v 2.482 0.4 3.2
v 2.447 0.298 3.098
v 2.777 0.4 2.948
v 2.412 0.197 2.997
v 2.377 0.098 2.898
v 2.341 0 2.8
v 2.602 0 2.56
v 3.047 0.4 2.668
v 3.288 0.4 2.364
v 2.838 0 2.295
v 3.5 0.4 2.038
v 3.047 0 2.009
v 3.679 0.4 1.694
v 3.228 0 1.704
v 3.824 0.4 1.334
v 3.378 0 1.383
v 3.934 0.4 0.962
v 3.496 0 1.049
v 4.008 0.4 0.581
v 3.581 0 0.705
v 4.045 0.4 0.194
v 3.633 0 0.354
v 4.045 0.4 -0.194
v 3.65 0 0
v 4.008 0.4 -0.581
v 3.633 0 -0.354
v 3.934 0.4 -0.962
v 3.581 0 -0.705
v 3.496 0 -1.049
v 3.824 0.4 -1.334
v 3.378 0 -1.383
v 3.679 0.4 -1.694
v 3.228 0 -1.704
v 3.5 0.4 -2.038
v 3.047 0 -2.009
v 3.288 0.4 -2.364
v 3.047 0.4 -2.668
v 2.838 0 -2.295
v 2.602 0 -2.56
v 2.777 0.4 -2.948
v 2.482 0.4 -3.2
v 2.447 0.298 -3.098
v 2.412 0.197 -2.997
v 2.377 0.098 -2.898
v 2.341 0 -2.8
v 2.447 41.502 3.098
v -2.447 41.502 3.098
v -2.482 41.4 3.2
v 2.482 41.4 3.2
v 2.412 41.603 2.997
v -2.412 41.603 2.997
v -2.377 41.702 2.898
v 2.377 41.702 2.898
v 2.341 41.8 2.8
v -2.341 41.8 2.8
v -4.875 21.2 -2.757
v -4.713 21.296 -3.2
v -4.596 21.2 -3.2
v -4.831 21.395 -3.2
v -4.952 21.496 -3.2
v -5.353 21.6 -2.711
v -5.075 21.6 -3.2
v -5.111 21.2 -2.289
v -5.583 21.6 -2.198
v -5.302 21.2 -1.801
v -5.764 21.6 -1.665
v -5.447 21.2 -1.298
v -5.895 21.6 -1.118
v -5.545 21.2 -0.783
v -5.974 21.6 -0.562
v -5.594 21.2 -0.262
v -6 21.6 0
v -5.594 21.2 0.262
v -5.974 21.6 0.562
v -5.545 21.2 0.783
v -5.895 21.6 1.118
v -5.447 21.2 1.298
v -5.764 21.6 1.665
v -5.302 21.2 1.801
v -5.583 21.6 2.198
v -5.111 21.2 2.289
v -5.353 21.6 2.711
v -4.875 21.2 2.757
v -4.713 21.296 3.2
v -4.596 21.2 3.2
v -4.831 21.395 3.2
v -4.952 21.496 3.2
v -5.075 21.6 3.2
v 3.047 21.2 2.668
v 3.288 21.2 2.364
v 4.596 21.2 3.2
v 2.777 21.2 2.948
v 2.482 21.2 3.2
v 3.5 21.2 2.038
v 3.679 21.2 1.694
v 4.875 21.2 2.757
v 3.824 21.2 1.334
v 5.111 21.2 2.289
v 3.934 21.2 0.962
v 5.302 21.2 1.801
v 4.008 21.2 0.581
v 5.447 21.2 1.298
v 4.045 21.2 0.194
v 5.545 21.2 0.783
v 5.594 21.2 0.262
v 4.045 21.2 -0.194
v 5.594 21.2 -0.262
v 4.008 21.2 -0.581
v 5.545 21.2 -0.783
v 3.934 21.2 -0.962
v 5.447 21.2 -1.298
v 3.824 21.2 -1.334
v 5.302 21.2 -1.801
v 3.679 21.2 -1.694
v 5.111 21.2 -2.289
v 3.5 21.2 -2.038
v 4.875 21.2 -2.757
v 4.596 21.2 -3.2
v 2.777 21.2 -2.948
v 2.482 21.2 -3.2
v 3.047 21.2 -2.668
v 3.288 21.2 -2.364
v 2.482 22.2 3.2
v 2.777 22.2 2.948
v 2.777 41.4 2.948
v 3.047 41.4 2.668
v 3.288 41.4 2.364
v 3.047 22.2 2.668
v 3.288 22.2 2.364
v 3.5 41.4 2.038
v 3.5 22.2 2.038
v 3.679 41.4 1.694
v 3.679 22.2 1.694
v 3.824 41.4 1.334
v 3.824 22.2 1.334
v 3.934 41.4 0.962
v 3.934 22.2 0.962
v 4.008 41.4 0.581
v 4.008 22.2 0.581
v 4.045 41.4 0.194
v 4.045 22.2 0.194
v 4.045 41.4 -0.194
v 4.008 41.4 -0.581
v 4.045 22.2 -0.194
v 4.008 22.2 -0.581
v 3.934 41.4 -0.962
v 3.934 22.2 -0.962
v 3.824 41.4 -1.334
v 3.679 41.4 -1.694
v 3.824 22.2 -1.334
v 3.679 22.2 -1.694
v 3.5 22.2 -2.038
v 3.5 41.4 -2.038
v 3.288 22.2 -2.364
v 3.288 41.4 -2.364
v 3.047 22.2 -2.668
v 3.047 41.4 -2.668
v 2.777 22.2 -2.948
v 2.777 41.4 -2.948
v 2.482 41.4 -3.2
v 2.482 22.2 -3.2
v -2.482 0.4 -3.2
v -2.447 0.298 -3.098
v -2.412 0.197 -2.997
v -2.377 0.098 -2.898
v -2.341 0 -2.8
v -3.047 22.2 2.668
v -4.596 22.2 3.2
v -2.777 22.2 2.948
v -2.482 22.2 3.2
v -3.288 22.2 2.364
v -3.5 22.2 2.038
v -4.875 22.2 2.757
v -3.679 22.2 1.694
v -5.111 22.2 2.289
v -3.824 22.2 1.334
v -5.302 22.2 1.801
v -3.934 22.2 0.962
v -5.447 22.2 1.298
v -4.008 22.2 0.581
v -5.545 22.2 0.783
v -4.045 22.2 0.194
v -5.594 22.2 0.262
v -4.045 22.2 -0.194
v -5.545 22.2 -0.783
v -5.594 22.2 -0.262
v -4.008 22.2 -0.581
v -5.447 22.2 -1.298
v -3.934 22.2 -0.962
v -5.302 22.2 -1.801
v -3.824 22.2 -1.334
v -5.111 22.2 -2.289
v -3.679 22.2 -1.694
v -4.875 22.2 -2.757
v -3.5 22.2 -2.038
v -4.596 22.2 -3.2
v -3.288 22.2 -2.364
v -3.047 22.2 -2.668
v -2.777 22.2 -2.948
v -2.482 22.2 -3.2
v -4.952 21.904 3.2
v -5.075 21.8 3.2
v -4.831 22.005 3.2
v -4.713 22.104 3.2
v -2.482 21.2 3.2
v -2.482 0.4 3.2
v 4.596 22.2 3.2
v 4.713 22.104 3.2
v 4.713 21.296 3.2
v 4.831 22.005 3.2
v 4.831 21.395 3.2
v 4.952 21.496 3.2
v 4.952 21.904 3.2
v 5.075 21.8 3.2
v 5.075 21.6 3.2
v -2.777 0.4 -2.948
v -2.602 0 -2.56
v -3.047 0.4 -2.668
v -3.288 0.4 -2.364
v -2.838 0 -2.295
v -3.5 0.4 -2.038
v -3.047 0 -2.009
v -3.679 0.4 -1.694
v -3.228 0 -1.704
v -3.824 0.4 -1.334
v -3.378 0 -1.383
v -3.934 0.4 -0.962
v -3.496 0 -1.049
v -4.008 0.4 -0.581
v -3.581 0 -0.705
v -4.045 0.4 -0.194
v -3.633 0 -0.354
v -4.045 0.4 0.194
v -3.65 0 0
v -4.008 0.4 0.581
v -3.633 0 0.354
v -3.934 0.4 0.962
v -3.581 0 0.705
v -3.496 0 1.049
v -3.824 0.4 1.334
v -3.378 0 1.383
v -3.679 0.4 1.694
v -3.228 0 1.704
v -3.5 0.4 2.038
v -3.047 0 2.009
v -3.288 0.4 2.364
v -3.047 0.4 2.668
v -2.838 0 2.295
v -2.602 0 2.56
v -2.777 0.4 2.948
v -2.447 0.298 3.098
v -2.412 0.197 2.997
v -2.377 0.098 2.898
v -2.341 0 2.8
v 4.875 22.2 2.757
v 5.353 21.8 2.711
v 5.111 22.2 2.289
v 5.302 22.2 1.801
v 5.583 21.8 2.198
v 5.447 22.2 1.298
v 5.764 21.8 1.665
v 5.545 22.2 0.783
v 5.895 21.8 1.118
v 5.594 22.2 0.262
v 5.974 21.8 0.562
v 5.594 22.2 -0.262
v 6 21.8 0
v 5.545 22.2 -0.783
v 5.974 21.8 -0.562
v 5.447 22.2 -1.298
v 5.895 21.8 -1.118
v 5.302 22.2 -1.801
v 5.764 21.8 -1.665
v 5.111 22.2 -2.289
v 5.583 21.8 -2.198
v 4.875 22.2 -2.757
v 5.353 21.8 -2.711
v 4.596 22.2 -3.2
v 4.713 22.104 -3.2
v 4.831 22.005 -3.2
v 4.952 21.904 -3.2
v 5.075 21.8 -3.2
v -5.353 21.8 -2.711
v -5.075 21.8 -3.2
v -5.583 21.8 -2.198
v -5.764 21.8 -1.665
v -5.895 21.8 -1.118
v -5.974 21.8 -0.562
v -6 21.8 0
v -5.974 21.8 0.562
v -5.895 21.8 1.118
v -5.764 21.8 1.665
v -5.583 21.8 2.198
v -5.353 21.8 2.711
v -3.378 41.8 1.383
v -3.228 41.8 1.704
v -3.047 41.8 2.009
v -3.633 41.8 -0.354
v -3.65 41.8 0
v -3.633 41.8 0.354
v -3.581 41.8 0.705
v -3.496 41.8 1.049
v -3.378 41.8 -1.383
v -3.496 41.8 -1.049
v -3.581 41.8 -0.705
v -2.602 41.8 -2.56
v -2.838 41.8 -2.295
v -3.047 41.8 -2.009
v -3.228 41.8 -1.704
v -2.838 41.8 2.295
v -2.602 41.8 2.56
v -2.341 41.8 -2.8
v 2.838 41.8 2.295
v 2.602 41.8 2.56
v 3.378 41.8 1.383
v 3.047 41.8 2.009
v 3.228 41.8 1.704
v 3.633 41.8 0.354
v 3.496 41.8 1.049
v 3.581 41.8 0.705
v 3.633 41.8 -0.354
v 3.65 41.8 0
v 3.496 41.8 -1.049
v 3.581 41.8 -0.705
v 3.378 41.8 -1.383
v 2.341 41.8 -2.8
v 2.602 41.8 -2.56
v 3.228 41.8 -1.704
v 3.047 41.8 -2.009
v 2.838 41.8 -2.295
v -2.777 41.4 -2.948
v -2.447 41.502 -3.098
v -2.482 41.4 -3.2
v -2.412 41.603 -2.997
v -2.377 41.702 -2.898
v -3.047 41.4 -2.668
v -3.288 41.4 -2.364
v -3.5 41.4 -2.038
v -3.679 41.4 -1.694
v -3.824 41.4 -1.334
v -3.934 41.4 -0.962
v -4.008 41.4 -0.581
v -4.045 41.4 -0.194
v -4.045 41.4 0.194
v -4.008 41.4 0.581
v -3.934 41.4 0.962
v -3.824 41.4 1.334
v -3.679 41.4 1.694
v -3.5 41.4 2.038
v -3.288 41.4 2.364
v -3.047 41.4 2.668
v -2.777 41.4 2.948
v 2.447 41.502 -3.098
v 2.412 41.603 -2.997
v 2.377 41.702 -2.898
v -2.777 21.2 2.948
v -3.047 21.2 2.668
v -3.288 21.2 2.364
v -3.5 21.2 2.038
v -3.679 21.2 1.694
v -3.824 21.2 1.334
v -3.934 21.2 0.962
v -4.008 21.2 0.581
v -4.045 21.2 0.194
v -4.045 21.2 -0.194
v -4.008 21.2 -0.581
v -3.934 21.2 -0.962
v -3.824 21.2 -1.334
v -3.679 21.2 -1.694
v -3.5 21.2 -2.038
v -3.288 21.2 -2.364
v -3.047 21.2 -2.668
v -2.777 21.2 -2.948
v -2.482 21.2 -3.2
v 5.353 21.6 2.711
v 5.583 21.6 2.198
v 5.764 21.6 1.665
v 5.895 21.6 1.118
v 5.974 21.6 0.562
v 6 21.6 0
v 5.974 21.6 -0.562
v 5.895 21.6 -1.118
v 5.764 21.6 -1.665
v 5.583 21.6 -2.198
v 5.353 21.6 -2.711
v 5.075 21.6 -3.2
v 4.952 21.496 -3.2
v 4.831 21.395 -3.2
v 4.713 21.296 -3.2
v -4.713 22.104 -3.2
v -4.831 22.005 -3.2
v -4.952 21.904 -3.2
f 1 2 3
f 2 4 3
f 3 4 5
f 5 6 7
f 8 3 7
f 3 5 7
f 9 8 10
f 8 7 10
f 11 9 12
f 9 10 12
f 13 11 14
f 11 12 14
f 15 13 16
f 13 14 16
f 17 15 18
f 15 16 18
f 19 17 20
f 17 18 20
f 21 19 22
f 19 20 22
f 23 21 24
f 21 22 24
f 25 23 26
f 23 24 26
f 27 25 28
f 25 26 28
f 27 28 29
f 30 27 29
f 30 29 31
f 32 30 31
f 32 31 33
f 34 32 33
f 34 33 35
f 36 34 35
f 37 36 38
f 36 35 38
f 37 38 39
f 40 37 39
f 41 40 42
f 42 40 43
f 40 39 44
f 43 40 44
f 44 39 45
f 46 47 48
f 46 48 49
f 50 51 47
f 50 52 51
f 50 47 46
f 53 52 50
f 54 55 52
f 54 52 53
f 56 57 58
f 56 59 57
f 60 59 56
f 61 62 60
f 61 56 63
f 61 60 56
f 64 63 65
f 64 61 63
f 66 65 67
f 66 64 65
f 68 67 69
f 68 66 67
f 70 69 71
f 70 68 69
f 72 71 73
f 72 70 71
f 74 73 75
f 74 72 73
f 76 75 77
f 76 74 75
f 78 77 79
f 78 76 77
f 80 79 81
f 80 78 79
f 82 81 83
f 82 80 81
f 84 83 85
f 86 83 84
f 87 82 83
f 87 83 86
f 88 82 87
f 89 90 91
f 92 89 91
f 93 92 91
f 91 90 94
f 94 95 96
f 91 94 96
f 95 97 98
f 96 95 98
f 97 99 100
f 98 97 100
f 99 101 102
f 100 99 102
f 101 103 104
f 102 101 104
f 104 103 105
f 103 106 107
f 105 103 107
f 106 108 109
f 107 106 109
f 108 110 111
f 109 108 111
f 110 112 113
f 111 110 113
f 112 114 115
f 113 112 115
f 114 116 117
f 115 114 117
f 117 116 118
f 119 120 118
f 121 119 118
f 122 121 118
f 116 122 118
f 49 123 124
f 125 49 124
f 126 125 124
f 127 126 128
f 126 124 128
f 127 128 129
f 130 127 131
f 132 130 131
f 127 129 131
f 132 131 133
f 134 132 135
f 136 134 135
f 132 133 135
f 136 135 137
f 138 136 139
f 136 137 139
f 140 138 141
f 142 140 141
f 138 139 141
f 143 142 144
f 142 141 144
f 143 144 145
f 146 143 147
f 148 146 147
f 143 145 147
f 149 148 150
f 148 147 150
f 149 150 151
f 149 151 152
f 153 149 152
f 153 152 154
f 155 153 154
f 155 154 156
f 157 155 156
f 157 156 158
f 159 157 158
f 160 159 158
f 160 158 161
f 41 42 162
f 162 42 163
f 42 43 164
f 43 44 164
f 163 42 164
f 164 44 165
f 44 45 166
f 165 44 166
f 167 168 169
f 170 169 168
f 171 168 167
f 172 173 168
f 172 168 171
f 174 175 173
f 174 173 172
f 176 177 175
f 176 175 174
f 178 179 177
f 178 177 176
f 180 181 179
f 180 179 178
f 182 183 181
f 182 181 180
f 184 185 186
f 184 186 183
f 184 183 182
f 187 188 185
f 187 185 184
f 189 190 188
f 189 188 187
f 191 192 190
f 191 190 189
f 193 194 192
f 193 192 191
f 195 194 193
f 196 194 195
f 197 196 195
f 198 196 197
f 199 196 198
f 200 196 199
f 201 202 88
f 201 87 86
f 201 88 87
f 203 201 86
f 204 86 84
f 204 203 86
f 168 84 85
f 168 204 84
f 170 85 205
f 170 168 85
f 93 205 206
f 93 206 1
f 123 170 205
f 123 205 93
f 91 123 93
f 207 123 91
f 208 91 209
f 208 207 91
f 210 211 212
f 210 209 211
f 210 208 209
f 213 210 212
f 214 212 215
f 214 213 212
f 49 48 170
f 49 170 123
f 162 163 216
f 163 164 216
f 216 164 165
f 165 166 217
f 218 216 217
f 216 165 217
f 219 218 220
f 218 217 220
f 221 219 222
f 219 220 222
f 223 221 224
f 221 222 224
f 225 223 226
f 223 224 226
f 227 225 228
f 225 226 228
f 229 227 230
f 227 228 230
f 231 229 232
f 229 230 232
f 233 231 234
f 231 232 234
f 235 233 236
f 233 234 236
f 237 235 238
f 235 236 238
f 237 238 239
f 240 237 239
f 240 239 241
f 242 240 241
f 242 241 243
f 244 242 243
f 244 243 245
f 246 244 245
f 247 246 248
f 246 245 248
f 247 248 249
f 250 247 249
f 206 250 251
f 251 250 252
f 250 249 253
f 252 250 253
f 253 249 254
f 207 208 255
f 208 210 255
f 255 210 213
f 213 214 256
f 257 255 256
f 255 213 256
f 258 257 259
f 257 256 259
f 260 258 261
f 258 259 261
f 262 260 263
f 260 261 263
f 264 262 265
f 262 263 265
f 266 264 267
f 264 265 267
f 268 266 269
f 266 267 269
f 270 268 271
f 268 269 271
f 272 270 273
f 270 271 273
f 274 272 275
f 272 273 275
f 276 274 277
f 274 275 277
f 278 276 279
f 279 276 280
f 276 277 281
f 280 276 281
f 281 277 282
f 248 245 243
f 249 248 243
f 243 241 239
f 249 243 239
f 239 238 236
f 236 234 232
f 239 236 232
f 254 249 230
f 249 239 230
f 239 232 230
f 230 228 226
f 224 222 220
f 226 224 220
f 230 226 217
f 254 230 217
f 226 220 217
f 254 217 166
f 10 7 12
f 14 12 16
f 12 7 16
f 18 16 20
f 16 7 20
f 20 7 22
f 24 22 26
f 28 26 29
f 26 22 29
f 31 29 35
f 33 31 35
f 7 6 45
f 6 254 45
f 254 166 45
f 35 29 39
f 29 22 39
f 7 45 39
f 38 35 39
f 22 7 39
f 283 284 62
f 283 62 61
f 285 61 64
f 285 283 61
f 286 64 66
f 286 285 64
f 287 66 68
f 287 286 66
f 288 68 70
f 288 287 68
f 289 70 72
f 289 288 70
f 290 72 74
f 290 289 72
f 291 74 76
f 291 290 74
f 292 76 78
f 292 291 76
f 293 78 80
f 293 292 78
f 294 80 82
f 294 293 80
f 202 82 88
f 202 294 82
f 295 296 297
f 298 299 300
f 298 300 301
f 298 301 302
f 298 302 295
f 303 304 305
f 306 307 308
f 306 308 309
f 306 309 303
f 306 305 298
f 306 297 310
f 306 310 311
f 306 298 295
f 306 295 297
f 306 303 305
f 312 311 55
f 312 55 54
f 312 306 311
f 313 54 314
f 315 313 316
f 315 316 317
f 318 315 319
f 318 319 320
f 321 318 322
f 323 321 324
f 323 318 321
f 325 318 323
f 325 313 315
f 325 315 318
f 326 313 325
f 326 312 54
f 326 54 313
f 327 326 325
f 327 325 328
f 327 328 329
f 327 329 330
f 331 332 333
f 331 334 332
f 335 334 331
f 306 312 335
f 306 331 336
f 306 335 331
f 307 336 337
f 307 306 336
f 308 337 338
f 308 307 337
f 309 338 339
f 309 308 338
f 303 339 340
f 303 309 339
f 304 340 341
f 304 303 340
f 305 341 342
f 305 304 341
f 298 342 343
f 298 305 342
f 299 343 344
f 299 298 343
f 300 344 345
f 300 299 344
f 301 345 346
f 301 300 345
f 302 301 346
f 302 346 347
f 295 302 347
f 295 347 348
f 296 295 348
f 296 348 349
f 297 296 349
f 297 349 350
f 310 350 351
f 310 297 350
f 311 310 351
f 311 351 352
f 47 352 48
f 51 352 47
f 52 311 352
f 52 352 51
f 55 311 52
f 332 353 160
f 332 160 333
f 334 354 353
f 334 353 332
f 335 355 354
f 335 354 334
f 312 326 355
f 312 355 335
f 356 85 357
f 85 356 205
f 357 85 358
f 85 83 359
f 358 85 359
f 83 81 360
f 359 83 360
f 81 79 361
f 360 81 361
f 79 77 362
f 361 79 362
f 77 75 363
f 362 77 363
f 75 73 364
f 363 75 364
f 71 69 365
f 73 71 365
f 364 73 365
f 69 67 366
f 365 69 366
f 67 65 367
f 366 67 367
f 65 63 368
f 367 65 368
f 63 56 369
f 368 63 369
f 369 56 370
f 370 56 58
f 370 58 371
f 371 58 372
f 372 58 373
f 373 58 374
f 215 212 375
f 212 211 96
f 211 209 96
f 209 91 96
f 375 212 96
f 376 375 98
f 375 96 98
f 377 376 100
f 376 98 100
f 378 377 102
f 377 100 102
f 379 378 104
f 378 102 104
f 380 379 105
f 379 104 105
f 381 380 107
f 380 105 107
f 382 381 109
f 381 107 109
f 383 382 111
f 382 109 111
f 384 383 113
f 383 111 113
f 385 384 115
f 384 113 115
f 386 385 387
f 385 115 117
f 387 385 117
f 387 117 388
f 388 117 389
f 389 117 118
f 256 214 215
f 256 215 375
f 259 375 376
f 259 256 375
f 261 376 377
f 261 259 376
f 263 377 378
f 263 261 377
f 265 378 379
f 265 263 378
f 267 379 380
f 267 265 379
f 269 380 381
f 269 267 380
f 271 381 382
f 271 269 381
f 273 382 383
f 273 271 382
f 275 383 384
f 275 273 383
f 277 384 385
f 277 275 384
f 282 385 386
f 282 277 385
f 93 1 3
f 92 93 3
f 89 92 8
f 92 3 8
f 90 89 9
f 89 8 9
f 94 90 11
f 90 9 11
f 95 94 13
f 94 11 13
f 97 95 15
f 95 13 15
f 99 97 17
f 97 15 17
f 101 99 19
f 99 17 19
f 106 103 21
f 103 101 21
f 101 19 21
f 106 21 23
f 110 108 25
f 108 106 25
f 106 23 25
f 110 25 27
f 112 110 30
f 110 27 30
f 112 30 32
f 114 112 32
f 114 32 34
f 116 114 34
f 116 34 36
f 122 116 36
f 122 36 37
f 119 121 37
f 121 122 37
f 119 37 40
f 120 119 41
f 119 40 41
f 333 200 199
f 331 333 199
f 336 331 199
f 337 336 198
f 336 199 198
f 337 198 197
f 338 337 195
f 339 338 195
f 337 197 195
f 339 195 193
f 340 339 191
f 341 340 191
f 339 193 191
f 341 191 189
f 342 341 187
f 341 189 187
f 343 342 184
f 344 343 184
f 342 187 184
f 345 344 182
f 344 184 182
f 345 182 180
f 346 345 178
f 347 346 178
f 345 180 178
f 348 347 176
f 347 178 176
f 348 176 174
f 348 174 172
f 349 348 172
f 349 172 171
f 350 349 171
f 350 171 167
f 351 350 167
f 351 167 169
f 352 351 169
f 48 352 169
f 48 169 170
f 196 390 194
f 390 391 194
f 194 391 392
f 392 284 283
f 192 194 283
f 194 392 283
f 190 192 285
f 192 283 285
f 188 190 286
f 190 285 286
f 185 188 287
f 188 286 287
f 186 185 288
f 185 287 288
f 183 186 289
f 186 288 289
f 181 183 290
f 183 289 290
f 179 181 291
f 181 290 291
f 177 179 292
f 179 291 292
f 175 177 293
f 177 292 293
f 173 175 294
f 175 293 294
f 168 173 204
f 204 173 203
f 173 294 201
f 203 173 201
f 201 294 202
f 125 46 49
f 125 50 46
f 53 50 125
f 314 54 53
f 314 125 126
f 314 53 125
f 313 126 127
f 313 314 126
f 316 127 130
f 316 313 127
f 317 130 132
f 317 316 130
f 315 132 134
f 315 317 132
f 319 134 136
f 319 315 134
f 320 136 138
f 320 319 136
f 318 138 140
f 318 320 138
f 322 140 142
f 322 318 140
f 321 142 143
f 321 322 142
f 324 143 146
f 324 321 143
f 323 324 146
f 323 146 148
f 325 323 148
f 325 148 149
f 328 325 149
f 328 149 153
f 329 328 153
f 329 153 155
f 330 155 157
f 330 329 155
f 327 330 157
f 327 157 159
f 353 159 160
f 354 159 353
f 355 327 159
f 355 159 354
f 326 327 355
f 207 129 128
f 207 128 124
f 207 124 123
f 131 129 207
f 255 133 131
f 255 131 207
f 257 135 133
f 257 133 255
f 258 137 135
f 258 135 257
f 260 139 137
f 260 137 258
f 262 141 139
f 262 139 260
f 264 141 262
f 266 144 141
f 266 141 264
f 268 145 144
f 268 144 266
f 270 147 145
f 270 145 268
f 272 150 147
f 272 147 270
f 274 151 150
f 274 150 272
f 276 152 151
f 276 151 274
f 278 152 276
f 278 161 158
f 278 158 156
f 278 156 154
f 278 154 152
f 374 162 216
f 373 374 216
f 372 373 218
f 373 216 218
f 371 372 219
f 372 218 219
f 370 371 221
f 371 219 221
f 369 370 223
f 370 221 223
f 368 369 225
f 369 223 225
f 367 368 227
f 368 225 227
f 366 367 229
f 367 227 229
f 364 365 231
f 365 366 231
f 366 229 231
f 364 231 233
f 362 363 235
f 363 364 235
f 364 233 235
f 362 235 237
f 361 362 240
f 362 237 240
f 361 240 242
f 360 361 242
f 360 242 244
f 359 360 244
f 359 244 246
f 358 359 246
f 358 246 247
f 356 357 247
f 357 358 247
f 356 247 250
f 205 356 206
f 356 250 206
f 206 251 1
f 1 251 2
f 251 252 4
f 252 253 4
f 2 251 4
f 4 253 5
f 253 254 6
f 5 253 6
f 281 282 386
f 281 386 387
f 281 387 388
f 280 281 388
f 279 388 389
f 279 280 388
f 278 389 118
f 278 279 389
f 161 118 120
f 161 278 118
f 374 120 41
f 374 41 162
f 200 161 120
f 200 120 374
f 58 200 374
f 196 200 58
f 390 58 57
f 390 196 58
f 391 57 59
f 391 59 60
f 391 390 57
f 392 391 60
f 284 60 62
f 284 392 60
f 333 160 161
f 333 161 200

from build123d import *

# Parameters (mm, degrees)
BOSS_EXTRUDE1_DEPTH = 41.8
CHAMFER1_SIZE       = 0.4
BOSS_EXTRUDE2_DEPTH = 1
CHAMFER2_SIZE       = 0.4


with BuildPart() as part:
    # Sketch1 → Boss-Extrude1 (new body)
    with BuildSketch(Plane(origin=(0, 0, 0), x_dir=(1, 0, 0), z_dir=(0, 1, 0))):
        with BuildLine():
            Line((-2.482438317, -3.2), (2.482438317, -3.2))
            ThreePointArc((2.482438317, -3.2), (4.05, 0), (2.482438317, 3.2))
            Line((2.482438317, 3.2), (-2.482438317, 3.2))
            ThreePointArc((-2.482438317, 3.2), (-4.05, 0), (-2.482438317, -3.2))
        make_face()
    extrude(amount=BOSS_EXTRUDE1_DEPTH)

    # Chamfer1
    chamfer1_edges = [part.edges().sort_by_distance(p)[0] for p in [
        (0, 41.8, -3.2),
        (-4.05, 41.8, 0),
        (4.05, 41.8, 0),
        (0, 41.8, 3.2),
        (4.05, 0, 0),
        (0, 0, 3.2),
        (-4.05, 0, 0),
        (0, 0, -3.2),
    ]]
    chamfer(chamfer1_edges, length=CHAMFER1_SIZE)

    # Sketch2 → Boss-Extrude2 (add)
    with BuildSketch(Plane(origin=(0, 22.2, 0), x_dir=(1, 0, 0), z_dir=(0, 1, 0))):
        with BuildLine():
            Line((-5.075431016, -3.2), (5.075431016, -3.2))
            ThreePointArc((5.075431016, -3.2), (6, 0), (5.075431016, 3.2))
            Line((5.075431016, 3.2), (-5.075431016, 3.2))
            ThreePointArc((-5.075431016, 3.2), (-6, 0), (-5.075431016, -3.2))
        make_face()
    extrude(amount=-BOSS_EXTRUDE2_DEPTH)

    # Chamfer2
    chamfer2_edges = [part.edges().sort_by_distance(p)[0] for p in [
        (-6, 22.2, 0),
        (-6, 21.2, 0),
        (6, 21.2, 0),
        (6, 22.2, 0),
    ]]
    chamfer(chamfer2_edges, length=CHAMFER2_SIZE)


solid = part.part
